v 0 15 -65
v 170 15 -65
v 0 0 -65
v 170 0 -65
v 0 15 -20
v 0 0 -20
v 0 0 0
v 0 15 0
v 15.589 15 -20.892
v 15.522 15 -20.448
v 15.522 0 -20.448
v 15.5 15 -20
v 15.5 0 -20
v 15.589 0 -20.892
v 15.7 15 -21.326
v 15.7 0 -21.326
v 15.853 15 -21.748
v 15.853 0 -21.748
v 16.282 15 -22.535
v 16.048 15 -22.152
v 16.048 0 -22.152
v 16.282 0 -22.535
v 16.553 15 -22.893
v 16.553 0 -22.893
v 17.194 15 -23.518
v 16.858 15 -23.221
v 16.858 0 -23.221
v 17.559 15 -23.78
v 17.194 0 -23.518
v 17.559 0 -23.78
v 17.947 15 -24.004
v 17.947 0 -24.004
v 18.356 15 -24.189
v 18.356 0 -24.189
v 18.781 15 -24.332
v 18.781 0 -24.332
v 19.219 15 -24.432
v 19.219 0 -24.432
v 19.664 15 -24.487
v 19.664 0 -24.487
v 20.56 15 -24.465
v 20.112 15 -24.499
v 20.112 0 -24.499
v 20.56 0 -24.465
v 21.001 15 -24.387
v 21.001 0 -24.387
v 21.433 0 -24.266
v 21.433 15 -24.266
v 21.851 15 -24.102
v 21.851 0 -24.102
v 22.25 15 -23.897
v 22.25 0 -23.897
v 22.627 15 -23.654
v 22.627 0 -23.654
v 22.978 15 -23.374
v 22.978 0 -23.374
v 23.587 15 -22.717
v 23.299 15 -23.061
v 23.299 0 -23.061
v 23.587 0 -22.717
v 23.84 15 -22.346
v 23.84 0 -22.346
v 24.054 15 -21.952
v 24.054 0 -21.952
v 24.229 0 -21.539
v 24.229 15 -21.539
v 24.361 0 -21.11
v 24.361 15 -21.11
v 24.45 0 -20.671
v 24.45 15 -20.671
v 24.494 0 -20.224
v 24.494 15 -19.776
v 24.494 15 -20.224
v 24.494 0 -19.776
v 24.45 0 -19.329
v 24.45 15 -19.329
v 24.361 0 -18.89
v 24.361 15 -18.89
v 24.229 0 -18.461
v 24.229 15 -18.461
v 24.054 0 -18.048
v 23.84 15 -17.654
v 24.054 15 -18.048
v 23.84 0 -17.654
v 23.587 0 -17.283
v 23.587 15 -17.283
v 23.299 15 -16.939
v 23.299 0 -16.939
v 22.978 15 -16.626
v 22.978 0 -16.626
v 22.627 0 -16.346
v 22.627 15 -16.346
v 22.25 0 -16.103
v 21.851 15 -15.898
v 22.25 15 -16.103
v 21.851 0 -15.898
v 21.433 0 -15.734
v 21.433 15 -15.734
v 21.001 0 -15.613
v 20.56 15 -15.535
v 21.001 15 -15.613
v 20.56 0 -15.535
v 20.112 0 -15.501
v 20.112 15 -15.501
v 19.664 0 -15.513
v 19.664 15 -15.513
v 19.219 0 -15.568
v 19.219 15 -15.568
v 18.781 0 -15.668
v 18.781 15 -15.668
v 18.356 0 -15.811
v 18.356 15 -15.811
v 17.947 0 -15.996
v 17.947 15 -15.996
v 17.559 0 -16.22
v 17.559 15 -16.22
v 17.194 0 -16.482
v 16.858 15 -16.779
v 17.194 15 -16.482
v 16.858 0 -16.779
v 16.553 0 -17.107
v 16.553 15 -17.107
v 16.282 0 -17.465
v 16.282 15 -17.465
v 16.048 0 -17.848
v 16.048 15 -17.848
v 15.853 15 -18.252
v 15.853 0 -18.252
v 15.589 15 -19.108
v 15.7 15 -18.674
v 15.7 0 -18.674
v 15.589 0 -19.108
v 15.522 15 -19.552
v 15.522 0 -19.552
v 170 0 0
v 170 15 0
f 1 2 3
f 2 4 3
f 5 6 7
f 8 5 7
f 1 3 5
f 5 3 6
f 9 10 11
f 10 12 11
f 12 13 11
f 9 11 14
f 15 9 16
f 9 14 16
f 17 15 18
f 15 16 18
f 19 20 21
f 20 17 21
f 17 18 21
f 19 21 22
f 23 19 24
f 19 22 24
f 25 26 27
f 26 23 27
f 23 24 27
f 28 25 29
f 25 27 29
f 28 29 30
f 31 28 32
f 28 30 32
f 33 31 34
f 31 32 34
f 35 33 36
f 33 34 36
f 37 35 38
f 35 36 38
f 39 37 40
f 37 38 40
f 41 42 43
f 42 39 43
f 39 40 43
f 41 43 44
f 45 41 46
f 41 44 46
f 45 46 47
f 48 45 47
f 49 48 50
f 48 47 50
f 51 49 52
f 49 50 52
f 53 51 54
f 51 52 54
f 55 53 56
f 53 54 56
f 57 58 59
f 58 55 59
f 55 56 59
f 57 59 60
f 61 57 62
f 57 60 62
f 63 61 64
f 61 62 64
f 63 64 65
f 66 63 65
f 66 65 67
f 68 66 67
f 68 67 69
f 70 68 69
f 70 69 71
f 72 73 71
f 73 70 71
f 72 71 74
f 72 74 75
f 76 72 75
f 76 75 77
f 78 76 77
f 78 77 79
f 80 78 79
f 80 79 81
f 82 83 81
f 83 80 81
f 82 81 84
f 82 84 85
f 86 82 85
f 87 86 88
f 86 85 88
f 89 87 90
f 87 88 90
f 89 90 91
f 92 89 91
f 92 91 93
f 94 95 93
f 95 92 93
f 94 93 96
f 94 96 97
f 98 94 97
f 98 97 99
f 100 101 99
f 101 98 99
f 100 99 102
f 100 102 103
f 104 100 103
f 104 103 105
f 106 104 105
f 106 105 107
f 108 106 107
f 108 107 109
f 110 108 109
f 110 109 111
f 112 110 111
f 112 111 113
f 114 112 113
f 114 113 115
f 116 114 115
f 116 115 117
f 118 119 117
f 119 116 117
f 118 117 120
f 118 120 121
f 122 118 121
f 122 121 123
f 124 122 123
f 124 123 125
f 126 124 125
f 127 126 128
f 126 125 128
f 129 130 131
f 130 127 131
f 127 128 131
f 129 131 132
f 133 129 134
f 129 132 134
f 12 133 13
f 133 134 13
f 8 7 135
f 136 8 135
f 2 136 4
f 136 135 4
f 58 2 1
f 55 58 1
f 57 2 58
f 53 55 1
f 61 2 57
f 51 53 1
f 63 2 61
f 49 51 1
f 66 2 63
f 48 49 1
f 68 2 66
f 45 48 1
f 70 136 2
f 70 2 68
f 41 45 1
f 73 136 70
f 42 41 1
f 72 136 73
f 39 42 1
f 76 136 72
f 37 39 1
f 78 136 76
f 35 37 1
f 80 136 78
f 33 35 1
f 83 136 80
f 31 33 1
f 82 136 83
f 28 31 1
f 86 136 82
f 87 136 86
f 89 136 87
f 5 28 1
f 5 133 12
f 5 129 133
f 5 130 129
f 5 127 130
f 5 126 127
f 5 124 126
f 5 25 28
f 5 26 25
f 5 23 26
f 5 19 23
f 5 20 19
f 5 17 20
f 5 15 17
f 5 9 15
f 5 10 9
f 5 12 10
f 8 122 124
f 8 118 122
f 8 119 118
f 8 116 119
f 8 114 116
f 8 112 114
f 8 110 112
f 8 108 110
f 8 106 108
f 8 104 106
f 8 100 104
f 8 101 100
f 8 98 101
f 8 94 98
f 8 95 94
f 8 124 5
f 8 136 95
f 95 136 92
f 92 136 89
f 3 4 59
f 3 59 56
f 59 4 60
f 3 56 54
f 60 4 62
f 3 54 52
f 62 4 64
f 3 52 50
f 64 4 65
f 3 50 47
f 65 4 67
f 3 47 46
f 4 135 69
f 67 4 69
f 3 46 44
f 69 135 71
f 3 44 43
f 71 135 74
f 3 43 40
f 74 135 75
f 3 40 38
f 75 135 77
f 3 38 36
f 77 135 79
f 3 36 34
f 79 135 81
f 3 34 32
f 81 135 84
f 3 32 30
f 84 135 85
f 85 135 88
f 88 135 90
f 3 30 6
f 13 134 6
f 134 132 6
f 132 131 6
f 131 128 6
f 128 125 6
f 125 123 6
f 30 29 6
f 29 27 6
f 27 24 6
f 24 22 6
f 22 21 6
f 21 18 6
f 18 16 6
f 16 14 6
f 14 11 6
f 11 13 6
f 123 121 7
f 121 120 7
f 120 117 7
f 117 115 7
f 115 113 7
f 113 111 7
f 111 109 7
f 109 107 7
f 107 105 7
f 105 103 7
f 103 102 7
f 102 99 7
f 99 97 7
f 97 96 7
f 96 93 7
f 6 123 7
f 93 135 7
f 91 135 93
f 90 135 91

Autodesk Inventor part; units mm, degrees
ref_plane "YZ Plane" through (0, 0, 0) normal (1, 0, 0) x (0, 1, 0)
ref_plane "XZ Plane" through (0, 0, 0) normal (0, 1, 0) x (-1, 0, 0)
ref_plane "XY Plane" through (0, 0, 0) normal (0, 0, 1) x (1, 0, 0)
sketch "Sketch1" plane through (0, 0, 0) normal (0, 1, 0) x (-1, 0, 0)
  line L0 (0, 0) -> (-170, 0)
  line L1 (-170, 0) -> (-170, -65)
  line L2 (-170, -65) -> (0, -65)
  line L3 (0, -65) -> (0, 0)
  line L4 (0, 0) -> (0, -20)
  line L5 (0, -20) -> (-20, -20)
  circle A0 centre (-20, -20) radius 4.5
  dimension "d0" = 170
  dimension "d1" = 65
  dimension "d2" = 20
  dimension "d3" = 20
  dimension "d4" = 9
extrude "Extrusion1" add sketch "Sketch1" along normal blind 15
properties part number "temp"
